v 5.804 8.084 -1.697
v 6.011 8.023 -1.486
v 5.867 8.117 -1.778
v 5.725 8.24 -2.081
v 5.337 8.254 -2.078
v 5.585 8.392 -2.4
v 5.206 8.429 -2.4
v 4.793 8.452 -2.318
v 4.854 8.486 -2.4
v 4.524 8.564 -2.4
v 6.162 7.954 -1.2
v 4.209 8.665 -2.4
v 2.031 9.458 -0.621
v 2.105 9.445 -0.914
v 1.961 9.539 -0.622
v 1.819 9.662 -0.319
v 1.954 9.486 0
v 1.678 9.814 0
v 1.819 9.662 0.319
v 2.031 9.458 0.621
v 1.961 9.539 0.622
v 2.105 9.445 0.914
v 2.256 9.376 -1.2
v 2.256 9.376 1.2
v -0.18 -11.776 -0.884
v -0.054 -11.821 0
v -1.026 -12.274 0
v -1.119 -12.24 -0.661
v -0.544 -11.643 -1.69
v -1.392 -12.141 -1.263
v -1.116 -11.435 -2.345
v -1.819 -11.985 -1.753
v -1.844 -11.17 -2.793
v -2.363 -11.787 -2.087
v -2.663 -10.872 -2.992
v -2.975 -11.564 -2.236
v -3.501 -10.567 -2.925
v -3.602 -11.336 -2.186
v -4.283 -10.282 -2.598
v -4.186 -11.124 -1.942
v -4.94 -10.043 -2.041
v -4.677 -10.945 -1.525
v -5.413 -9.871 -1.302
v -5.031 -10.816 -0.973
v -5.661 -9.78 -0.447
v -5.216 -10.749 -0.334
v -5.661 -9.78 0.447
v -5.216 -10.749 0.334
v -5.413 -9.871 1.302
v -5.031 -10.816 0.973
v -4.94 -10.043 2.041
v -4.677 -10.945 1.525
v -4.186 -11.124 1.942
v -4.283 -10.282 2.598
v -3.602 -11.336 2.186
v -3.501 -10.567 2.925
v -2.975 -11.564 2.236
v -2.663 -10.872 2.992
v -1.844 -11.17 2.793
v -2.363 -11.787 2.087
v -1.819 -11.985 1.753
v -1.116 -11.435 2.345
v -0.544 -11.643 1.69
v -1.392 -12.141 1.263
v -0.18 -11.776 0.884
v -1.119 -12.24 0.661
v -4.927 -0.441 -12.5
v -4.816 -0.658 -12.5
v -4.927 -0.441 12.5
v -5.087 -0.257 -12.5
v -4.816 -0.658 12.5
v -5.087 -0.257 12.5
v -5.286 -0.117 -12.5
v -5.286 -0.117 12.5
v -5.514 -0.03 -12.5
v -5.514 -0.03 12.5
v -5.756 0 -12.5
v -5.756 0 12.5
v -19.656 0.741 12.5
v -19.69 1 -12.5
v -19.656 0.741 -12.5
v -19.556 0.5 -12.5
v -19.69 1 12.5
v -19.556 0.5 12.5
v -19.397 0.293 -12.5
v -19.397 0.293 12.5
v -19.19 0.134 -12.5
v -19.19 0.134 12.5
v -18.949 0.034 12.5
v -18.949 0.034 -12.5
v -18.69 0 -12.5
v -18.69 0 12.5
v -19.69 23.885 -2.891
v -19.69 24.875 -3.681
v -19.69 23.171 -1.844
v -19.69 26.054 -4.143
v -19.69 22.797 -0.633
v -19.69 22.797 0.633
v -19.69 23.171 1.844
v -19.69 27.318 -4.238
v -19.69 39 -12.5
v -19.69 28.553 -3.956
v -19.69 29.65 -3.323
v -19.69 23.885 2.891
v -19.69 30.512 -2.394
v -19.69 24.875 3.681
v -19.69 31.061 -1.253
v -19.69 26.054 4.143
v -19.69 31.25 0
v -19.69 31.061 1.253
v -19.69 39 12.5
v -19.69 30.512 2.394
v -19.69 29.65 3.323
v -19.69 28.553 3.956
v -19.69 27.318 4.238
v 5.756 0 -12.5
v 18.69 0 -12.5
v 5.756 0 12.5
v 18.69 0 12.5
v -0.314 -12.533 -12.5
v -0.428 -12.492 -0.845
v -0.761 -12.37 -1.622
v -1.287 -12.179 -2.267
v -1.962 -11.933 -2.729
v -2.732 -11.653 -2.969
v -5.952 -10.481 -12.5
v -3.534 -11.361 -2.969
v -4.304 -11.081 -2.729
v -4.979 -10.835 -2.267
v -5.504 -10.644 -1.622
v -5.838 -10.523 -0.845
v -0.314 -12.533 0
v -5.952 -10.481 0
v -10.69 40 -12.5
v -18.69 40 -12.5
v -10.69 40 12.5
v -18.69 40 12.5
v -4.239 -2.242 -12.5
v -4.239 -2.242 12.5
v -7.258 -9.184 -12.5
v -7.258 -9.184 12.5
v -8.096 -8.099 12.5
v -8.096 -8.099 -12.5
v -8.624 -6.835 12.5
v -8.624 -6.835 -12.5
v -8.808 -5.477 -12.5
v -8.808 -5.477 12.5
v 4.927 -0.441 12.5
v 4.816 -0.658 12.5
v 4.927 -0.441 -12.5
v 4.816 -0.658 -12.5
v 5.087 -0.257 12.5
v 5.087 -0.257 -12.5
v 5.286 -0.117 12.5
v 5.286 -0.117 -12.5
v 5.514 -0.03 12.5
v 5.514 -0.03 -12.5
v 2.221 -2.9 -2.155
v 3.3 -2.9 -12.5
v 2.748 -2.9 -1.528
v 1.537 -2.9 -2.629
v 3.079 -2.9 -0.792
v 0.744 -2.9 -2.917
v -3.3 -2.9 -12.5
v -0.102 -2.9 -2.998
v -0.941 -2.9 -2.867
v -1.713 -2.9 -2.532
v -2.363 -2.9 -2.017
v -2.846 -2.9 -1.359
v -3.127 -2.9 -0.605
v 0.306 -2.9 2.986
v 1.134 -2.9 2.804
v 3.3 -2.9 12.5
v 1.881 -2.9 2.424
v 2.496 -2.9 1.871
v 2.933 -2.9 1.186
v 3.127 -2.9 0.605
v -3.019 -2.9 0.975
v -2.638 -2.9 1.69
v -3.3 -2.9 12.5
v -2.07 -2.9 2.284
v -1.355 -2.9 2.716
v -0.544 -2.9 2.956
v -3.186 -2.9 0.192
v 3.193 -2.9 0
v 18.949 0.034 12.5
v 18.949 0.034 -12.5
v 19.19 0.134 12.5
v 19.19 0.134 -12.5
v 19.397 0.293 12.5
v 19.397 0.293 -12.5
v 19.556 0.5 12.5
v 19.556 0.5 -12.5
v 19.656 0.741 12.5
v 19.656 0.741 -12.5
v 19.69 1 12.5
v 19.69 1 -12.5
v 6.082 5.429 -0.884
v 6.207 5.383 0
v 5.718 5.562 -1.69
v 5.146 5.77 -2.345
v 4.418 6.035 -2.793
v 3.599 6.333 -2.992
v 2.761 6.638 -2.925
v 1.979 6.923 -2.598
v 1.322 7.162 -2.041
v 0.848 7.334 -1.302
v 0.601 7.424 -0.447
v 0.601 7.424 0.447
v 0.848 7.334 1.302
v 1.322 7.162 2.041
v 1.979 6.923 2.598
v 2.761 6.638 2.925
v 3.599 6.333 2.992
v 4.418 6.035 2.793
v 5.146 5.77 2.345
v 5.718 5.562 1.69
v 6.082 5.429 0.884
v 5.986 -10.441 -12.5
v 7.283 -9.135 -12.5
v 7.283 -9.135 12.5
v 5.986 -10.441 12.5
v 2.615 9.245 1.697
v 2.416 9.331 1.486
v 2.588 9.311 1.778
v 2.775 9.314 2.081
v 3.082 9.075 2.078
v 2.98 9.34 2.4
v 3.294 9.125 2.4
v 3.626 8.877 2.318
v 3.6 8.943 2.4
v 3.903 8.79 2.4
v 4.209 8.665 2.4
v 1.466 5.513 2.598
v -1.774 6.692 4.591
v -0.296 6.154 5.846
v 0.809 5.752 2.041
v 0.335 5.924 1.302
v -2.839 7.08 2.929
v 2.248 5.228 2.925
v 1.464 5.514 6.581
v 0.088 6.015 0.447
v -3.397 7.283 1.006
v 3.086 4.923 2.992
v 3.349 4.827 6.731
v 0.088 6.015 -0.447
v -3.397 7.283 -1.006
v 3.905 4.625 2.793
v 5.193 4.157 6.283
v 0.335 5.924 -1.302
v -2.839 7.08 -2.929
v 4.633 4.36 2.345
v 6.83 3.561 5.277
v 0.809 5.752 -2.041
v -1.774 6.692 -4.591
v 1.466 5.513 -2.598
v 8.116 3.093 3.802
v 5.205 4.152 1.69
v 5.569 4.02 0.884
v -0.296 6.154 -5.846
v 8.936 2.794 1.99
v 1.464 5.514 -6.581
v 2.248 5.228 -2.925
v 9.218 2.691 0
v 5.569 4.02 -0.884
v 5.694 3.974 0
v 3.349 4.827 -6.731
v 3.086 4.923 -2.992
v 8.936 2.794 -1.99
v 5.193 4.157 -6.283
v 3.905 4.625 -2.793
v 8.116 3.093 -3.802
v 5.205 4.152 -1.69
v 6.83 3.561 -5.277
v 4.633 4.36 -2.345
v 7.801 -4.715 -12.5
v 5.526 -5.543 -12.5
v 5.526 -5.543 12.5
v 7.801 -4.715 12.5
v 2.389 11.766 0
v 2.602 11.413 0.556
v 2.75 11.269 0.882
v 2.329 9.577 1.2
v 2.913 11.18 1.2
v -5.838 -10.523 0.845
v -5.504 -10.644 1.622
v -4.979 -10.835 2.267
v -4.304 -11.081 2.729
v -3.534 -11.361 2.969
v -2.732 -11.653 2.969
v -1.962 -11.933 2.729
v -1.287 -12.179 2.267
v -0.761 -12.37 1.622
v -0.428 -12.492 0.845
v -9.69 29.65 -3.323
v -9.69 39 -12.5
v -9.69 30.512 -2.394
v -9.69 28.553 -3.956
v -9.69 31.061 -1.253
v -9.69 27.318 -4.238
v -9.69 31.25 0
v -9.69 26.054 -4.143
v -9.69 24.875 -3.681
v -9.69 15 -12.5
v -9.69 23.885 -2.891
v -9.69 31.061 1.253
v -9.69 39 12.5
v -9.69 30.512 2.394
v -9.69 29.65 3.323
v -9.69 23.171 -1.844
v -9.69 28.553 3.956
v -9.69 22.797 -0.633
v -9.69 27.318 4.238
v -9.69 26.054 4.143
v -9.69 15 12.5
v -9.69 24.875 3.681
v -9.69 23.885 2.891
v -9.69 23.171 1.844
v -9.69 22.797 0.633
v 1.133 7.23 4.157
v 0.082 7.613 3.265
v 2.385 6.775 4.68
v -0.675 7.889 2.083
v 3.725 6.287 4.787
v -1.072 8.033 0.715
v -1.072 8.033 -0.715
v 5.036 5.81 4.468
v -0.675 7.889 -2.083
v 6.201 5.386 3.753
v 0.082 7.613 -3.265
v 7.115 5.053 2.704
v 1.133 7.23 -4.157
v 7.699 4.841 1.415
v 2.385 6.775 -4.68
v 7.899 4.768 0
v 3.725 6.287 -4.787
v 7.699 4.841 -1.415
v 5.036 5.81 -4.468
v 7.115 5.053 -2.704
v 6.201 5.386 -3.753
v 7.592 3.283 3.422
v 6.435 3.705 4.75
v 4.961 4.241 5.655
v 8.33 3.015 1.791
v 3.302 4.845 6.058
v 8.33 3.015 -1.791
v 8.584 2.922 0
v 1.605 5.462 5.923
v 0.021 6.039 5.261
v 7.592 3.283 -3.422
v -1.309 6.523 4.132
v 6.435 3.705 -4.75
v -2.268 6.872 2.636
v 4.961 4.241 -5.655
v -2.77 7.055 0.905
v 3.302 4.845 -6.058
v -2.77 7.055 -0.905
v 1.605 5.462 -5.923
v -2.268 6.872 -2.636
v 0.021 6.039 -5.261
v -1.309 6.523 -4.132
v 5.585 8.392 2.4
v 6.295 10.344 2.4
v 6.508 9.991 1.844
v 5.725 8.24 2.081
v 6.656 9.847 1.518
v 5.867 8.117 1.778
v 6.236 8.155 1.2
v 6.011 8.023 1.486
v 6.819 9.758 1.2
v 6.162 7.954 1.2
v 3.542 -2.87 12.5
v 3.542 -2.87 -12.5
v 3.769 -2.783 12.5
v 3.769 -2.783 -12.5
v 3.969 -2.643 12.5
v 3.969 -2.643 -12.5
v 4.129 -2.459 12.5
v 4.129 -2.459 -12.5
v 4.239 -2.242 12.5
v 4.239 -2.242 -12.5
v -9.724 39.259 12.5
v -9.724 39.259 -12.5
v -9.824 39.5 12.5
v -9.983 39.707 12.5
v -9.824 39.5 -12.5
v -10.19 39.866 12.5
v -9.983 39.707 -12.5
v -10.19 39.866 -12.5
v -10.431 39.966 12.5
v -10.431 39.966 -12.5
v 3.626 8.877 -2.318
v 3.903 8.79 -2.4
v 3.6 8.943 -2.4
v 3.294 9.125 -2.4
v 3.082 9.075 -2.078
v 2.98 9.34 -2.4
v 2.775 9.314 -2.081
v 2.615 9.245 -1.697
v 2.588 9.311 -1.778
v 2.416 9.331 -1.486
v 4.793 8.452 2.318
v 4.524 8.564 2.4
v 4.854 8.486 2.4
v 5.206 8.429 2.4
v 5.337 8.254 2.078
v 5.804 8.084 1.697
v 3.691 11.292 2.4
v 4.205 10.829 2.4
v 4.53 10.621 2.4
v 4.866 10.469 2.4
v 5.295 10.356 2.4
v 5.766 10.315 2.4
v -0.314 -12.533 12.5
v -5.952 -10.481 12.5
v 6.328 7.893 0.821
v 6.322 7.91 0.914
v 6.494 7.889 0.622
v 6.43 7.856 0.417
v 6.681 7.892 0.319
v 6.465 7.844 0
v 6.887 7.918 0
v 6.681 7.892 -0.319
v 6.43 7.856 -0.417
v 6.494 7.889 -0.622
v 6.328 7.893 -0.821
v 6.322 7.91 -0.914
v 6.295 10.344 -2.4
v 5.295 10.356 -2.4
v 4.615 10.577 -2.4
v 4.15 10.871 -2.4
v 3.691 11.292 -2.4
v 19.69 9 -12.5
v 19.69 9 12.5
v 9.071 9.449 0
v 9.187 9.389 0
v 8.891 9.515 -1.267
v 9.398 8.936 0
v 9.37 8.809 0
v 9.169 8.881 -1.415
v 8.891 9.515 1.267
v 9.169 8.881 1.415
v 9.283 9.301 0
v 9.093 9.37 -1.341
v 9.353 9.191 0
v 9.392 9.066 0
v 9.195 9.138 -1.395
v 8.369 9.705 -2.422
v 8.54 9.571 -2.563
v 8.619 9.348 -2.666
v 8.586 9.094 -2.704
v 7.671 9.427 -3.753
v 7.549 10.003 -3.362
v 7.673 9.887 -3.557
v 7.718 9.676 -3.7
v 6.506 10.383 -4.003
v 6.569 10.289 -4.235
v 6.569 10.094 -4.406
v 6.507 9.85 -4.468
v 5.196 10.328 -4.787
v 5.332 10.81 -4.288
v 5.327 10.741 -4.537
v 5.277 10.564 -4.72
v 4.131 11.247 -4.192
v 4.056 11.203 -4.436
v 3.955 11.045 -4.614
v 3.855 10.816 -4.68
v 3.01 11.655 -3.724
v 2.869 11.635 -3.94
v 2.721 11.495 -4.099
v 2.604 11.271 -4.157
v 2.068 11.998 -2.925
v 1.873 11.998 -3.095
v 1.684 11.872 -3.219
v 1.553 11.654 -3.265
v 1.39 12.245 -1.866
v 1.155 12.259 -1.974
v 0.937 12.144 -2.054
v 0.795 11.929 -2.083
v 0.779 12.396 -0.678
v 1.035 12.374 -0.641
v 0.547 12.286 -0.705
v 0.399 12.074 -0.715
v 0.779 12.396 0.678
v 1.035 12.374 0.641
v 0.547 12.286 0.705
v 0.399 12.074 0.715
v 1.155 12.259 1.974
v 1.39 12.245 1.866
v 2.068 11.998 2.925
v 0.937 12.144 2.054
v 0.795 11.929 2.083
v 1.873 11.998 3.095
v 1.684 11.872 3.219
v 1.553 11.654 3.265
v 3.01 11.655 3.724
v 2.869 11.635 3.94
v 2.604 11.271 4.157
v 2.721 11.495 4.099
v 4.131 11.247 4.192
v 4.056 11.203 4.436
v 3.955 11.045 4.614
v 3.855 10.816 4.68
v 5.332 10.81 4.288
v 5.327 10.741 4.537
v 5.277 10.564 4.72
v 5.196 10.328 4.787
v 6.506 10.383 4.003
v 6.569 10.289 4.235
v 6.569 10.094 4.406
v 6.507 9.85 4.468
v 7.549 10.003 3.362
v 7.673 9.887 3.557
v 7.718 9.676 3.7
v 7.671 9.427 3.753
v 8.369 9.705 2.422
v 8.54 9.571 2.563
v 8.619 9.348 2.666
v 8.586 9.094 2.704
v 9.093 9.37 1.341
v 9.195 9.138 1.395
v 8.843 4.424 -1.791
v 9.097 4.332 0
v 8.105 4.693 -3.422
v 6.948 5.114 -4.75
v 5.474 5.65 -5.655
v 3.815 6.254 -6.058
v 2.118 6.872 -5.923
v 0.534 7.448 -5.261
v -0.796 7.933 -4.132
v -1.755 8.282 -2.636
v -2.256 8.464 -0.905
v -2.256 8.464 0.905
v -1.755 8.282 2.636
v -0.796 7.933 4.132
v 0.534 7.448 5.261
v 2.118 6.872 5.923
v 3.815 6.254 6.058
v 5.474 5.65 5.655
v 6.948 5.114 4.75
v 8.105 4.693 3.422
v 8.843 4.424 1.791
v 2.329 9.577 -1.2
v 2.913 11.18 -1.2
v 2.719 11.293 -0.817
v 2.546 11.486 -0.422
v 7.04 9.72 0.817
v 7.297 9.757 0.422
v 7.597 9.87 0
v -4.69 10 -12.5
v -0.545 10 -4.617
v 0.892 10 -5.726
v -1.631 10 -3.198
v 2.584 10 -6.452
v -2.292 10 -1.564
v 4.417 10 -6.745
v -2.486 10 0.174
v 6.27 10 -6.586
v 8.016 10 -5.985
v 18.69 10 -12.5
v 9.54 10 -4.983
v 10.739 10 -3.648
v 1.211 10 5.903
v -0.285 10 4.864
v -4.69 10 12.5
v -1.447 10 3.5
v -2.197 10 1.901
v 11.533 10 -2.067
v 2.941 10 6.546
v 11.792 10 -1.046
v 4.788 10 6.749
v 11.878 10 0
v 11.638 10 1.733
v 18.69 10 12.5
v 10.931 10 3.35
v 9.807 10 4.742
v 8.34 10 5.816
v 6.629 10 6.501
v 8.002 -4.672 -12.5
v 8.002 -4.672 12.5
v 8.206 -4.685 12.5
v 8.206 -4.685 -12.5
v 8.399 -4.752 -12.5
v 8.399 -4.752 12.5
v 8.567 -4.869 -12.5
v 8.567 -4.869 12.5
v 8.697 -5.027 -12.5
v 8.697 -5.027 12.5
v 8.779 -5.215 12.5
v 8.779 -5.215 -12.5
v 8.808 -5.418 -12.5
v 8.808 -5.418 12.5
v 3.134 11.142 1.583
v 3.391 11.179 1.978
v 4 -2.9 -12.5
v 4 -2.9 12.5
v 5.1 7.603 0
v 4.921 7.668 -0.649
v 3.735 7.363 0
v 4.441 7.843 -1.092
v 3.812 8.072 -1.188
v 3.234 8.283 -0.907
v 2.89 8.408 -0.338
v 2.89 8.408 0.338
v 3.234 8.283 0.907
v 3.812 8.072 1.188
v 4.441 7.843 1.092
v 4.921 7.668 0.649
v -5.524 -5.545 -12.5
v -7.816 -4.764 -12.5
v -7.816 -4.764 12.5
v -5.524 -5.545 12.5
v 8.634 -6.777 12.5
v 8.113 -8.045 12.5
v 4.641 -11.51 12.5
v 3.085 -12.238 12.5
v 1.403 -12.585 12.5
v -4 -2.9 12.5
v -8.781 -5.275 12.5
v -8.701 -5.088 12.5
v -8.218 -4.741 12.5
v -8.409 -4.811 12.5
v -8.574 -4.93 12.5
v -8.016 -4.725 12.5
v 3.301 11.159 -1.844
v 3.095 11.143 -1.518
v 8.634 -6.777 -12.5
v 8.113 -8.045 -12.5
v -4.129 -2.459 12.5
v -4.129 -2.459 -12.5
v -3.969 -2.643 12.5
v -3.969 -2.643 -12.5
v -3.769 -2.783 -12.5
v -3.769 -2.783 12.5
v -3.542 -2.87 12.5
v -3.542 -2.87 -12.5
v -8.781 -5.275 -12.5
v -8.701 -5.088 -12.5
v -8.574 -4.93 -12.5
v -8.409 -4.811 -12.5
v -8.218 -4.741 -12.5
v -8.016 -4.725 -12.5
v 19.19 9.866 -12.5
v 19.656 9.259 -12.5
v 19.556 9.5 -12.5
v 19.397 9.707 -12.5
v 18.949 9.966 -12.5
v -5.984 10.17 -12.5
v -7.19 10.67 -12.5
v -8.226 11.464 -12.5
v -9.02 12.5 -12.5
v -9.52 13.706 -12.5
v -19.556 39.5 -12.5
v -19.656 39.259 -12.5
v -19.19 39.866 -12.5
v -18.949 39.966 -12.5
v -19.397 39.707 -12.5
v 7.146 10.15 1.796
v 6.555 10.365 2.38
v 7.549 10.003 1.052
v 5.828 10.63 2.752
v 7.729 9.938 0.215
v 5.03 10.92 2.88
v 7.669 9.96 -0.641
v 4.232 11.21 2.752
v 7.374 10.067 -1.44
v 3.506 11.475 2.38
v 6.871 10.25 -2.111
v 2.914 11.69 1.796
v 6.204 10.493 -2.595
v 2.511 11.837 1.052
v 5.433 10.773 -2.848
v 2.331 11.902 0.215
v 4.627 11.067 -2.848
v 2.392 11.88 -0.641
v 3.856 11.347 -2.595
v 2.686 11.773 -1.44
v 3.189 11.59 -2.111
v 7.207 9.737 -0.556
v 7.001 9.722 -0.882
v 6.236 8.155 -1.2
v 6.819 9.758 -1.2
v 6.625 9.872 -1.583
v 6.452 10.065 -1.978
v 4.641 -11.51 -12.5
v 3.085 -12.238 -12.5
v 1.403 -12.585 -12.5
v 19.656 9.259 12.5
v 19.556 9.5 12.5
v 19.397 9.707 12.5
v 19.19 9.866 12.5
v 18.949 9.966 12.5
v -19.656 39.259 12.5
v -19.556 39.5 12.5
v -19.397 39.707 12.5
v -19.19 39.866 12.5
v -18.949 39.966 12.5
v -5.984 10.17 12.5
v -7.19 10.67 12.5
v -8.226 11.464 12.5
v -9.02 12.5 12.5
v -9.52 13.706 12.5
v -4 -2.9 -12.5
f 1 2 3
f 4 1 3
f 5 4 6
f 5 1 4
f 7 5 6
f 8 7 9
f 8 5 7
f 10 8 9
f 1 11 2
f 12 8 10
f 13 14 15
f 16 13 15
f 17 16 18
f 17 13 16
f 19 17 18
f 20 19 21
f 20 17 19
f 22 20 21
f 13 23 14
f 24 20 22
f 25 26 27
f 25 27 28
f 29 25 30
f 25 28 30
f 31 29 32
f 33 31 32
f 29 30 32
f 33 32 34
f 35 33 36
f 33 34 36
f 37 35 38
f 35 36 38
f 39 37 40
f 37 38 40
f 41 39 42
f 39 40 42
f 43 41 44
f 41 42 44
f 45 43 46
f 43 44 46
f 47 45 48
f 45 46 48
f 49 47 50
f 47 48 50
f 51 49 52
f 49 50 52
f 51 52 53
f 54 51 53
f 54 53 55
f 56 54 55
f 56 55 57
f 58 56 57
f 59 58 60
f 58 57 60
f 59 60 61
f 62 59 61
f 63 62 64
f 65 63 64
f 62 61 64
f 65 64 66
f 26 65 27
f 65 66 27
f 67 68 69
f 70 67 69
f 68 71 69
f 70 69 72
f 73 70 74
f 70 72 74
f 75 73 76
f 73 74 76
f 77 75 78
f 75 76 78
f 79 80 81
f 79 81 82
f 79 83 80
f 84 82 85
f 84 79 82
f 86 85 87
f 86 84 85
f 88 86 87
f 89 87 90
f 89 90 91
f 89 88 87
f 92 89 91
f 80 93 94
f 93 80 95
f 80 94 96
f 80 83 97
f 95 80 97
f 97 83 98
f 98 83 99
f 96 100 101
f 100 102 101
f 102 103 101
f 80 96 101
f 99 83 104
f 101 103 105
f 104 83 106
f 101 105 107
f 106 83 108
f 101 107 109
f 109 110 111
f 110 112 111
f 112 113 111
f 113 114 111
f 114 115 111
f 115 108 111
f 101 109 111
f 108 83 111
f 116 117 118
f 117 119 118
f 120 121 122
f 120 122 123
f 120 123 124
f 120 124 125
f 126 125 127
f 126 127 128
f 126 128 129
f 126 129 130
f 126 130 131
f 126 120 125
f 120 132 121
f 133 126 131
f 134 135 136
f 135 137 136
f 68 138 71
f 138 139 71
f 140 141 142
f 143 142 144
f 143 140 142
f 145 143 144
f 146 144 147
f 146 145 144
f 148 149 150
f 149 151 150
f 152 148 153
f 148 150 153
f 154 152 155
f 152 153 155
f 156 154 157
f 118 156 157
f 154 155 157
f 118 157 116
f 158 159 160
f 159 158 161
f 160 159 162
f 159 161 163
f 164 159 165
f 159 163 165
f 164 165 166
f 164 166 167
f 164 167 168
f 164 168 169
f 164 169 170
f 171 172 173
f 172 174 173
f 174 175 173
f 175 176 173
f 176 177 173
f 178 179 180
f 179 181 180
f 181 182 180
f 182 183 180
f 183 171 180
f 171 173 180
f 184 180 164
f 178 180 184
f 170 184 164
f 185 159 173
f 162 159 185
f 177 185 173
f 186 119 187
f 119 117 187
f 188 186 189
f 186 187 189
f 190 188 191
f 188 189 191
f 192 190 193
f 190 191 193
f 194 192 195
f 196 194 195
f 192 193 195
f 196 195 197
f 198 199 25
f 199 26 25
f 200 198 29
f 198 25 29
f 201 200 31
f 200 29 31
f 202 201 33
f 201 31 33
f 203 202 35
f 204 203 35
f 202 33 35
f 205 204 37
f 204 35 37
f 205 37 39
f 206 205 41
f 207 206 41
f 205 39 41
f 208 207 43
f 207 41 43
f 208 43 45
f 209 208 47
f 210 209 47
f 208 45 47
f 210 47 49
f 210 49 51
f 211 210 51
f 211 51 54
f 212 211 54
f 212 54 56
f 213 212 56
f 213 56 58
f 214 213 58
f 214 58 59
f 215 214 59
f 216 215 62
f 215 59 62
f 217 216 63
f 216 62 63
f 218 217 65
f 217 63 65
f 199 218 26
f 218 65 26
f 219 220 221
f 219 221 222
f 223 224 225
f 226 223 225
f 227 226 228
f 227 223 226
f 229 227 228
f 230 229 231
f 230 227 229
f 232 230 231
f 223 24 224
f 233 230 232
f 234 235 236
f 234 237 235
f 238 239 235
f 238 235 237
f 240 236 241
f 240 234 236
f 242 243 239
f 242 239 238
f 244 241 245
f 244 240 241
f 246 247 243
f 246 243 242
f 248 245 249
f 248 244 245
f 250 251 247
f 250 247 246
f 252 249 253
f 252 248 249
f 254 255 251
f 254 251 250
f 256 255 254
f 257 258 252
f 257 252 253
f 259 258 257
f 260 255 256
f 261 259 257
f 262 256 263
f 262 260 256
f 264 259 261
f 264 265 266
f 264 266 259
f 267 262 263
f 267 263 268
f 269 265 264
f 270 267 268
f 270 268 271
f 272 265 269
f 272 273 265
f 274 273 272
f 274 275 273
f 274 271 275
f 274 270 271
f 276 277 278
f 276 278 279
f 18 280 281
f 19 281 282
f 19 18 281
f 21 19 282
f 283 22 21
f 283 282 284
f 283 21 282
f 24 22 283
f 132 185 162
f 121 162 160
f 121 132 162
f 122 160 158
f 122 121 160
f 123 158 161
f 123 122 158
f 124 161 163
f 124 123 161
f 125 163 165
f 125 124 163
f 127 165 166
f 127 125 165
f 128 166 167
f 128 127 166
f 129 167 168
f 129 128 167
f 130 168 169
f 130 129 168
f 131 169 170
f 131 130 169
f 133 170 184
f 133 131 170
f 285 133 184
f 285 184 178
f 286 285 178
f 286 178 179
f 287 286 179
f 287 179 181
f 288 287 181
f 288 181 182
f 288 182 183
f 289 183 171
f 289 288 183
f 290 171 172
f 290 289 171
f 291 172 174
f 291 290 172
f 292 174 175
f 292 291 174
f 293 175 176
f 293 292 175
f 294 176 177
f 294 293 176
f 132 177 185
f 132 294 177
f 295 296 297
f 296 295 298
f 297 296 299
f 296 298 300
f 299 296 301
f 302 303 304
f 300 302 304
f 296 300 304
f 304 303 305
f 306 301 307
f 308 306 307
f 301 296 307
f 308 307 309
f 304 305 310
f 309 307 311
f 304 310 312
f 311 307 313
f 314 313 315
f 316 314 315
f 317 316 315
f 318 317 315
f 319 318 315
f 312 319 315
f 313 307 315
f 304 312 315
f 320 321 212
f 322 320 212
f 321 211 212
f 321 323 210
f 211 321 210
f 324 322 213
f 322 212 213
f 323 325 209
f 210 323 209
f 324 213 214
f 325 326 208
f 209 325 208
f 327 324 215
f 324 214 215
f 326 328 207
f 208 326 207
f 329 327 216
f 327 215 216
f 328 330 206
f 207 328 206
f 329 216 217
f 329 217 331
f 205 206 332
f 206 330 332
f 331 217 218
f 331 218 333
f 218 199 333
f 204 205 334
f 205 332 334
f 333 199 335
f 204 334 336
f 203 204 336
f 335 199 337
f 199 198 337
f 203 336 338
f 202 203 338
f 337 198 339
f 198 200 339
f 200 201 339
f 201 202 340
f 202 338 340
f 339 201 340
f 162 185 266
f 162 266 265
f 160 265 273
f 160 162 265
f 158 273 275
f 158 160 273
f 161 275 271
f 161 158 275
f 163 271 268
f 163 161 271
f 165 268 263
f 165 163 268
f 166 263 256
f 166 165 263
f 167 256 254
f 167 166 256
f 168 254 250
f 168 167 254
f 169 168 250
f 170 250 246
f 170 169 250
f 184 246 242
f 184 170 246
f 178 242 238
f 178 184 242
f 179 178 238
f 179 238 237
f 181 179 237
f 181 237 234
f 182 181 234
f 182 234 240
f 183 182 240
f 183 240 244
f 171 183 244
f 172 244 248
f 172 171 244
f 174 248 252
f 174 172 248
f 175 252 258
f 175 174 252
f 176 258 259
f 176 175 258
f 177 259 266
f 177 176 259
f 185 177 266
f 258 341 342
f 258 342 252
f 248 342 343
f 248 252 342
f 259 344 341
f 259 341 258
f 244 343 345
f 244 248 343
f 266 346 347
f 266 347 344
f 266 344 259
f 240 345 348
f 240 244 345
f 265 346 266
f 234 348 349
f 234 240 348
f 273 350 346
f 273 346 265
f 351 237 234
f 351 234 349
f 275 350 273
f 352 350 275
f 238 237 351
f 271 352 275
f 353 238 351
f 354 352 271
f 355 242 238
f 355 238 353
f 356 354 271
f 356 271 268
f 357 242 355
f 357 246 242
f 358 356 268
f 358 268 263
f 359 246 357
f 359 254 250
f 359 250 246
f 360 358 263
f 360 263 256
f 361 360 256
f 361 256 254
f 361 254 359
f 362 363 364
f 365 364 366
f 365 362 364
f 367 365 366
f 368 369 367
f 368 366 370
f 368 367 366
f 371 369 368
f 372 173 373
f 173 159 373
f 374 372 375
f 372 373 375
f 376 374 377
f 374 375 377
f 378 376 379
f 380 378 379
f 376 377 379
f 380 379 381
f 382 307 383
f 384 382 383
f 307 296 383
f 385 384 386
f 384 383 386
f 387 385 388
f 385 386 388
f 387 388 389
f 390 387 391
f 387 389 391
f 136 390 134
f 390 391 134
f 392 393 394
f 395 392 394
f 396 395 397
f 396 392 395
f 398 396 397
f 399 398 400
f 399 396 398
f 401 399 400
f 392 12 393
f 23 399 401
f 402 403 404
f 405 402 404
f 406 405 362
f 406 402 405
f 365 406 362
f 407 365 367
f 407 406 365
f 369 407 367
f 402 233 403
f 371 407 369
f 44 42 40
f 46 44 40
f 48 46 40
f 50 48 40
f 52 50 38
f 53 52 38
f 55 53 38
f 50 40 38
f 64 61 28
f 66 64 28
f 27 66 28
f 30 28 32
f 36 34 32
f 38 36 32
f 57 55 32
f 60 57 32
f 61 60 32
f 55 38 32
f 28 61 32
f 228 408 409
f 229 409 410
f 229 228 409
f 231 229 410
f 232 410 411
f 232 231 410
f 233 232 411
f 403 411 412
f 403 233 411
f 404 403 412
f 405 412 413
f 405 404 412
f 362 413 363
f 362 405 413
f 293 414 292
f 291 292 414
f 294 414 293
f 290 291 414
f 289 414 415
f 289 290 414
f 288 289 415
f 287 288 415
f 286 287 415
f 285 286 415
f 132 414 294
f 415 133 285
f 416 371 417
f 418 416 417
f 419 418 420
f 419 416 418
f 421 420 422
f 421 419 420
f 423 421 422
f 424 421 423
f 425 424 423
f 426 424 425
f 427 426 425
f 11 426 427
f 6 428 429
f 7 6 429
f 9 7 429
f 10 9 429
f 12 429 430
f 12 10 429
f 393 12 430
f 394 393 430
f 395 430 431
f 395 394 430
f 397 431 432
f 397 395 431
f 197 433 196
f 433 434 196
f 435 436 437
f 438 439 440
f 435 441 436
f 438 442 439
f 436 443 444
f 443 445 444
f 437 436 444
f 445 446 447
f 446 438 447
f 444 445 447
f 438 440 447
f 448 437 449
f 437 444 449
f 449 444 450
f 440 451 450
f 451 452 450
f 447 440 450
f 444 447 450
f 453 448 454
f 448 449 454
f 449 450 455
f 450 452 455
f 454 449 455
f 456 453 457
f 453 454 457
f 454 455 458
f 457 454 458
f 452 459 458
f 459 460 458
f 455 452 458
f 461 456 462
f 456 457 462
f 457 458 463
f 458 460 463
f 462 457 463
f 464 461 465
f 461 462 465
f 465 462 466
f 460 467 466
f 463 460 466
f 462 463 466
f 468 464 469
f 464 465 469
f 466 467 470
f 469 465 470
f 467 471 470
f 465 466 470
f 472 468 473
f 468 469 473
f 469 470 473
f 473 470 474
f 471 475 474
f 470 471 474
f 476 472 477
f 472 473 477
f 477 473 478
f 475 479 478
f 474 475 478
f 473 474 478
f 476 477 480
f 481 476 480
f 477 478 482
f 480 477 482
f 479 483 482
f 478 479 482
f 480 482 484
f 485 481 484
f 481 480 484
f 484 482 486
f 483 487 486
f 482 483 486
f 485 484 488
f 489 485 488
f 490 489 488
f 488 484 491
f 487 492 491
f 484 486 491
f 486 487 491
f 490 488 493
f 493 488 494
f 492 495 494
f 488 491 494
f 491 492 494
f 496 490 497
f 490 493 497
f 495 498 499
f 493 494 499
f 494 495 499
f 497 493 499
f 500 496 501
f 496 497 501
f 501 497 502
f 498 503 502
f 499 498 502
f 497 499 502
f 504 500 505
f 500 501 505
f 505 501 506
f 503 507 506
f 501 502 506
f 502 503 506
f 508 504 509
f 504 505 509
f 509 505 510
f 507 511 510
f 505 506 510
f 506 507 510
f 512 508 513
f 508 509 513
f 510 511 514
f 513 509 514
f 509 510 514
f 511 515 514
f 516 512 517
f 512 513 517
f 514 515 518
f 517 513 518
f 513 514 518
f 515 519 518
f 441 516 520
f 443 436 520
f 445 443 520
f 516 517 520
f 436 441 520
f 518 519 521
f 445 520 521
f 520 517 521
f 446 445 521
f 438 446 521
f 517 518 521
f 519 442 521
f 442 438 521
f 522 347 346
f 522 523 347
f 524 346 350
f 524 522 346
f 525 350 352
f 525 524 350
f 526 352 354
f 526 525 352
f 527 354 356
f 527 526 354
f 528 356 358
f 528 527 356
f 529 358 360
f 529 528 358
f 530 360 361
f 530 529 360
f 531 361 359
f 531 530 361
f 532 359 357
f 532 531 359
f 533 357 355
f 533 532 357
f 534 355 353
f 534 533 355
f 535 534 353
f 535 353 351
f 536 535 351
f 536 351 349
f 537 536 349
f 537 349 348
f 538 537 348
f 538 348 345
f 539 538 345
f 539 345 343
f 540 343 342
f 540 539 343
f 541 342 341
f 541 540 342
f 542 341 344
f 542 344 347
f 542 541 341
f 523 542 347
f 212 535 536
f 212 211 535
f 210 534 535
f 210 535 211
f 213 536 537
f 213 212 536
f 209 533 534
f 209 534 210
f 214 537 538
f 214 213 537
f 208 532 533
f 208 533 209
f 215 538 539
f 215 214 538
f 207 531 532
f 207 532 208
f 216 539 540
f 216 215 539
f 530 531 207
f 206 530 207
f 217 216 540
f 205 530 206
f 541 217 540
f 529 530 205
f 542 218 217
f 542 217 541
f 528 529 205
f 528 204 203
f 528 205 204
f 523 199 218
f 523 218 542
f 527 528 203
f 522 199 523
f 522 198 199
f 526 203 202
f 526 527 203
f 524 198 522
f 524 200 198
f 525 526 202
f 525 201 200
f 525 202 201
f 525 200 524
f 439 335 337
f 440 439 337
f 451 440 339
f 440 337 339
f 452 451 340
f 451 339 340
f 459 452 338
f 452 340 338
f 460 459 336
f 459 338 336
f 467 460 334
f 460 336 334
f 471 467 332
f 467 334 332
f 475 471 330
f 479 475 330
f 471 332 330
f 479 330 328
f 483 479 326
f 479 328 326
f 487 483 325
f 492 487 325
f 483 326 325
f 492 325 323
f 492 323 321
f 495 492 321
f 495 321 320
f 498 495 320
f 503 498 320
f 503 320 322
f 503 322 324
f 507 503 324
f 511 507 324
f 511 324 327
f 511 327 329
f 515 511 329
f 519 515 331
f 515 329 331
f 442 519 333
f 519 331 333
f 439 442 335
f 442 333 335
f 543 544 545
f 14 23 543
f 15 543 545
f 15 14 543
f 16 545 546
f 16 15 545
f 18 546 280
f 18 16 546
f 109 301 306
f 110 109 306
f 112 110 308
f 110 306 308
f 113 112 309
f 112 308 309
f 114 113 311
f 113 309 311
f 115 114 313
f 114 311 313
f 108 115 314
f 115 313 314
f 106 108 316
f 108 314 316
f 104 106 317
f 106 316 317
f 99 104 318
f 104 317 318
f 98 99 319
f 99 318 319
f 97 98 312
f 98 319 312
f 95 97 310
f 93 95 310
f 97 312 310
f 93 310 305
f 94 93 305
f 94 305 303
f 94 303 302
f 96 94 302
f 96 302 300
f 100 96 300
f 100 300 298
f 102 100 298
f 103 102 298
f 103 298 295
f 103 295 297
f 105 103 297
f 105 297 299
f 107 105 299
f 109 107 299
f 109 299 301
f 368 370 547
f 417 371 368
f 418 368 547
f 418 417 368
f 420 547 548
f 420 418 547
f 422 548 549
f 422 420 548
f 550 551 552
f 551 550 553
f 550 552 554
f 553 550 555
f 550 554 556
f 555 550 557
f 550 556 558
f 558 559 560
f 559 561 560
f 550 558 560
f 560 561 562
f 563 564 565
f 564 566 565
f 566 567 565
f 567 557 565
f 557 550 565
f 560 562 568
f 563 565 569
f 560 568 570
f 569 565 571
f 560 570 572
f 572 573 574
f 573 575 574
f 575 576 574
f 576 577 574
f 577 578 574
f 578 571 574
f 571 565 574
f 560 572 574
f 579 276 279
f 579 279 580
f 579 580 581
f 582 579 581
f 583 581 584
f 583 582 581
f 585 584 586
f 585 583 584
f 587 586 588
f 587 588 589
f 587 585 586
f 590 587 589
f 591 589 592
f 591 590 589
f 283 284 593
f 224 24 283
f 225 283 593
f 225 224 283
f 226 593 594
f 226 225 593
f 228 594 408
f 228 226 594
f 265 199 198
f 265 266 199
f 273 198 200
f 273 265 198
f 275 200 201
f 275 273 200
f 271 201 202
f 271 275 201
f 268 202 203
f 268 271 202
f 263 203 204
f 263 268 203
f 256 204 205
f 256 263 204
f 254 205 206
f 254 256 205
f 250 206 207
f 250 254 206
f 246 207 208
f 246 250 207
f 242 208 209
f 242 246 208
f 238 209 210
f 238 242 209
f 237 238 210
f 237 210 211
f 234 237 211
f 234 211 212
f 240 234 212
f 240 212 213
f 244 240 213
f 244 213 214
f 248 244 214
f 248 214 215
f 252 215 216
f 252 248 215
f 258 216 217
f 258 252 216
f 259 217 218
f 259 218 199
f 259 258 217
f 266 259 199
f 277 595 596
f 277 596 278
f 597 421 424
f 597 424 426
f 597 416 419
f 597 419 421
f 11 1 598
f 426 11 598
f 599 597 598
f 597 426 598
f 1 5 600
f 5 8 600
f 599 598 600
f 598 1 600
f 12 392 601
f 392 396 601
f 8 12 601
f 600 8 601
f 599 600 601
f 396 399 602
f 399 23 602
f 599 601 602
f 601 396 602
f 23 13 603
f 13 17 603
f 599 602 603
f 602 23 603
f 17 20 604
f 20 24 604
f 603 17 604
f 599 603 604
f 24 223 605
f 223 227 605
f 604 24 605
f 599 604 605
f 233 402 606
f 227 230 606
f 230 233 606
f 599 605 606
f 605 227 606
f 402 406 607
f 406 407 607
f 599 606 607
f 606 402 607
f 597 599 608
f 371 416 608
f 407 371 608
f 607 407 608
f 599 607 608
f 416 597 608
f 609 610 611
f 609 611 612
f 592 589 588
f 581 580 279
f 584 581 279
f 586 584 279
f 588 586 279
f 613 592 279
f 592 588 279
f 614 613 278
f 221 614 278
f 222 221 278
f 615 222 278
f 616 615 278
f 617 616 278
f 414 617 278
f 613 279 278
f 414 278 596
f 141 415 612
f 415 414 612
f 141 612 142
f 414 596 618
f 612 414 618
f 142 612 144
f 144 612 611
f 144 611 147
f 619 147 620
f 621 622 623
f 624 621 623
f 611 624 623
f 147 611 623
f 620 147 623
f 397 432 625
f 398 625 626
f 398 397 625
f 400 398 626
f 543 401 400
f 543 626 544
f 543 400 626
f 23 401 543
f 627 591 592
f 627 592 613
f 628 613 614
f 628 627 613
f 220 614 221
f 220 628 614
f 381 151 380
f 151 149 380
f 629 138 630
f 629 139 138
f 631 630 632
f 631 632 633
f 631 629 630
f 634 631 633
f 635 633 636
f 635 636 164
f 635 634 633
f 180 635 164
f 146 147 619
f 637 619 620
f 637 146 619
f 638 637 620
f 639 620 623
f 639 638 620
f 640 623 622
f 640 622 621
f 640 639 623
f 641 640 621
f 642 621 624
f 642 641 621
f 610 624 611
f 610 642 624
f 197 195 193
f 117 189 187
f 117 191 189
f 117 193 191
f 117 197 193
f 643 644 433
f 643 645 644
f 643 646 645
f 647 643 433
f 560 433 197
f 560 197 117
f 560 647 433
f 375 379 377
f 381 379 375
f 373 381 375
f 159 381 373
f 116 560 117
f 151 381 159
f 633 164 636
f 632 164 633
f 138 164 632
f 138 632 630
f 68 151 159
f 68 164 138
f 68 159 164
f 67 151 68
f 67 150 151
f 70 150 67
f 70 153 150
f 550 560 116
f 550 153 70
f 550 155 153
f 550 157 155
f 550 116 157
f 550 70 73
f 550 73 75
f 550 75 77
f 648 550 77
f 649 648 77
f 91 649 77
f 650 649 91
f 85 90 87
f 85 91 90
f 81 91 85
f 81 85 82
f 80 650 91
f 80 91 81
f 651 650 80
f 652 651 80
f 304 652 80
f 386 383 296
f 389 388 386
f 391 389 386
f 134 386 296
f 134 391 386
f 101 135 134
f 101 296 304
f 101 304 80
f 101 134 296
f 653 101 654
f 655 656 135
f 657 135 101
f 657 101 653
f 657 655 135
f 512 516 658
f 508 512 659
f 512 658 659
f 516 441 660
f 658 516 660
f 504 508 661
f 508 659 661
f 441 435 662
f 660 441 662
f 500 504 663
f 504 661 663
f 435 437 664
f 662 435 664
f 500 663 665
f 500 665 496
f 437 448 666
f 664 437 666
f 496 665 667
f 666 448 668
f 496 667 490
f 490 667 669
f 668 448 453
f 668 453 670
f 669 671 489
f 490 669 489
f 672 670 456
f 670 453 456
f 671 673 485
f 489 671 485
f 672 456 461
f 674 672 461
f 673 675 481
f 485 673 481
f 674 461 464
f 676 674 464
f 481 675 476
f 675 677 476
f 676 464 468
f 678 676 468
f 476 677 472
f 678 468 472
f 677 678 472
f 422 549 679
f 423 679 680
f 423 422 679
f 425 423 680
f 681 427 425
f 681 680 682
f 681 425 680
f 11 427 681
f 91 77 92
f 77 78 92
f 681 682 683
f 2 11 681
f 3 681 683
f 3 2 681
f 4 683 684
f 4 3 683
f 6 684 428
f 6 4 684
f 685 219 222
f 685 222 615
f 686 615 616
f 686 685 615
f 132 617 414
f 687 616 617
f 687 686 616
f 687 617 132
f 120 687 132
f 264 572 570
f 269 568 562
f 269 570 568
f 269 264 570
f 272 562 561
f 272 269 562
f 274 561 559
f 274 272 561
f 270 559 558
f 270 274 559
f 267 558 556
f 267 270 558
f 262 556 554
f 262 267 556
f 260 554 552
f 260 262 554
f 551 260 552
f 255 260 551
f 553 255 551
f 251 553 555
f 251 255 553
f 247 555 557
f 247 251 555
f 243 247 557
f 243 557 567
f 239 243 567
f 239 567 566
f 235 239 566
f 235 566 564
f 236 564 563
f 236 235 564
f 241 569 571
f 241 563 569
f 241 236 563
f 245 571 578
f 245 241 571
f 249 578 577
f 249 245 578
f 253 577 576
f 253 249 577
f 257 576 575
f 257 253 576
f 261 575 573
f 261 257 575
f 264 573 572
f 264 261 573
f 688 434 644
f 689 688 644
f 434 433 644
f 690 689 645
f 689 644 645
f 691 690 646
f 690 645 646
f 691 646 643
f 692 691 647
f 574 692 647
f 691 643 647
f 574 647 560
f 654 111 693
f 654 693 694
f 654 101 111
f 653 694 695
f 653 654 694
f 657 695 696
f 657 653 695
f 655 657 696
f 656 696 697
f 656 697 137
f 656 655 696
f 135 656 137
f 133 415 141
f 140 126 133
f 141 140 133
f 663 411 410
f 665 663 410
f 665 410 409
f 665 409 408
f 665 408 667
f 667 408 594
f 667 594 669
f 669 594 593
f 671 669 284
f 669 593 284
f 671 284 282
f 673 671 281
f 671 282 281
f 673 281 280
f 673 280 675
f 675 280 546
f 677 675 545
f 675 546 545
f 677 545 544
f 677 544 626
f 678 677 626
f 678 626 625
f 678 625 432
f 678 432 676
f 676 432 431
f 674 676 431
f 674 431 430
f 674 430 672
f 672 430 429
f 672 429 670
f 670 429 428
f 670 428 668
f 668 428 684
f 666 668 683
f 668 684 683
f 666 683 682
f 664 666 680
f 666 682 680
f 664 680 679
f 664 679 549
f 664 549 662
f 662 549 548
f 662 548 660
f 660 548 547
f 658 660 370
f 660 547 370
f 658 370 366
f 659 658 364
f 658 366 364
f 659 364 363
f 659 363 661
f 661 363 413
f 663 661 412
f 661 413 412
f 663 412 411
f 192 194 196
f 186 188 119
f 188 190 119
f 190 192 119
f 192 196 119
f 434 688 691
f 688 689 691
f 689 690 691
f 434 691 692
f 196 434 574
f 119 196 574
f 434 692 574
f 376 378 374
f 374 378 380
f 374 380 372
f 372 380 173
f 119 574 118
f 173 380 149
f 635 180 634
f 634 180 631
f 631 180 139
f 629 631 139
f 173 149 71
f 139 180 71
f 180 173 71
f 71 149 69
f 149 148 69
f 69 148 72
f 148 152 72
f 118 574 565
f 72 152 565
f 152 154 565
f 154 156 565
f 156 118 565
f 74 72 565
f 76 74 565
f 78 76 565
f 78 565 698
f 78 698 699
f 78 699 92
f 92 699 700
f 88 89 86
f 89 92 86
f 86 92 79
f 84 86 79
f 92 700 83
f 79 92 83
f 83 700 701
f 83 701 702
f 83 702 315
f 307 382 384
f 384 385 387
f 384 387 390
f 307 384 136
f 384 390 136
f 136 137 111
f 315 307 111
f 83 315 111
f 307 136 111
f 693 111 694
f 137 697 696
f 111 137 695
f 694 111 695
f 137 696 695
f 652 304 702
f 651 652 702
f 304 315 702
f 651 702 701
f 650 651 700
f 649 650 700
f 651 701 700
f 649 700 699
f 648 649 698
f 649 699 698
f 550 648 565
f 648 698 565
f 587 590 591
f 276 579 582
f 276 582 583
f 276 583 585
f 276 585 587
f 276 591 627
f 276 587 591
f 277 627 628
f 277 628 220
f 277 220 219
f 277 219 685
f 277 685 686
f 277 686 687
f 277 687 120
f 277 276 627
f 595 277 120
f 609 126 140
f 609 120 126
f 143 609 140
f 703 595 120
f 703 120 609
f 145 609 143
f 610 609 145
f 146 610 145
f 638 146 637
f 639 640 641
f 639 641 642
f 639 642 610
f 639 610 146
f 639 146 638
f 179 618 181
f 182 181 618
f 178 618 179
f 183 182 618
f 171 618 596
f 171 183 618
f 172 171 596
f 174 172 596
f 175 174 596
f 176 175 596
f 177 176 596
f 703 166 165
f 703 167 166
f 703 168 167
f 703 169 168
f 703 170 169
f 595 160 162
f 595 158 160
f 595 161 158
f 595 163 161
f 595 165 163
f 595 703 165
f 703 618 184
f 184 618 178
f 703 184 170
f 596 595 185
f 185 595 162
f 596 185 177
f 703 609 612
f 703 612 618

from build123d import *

# Parameters (mm, degrees)
BOSS_EXTRUDE1_DEPTH  = 12.5
BOSS_EXTRUDE2_DEPTH  = 25
FILLET1_R            = 1
SKETCH5_R            = 4.25
CUT_EXTRUDE1_DEPTH   = 52.180410315
CUT_EXTRUDE2_START   = -2.185640545
CUT_EXTRUDE2_DEPTH   = 3.185640545
CUT_EXTRUDE2_START_2 = 9.581895702
CUT_EXTRUDE2_2_DEPTH = 0.214359555
FILLET2_R            = 0.5


with BuildPart() as part:
    # Sketch3 → Boss-Extrude1 (new, symmetric)
    with BuildSketch(Plane.XY):
        with BuildLine():
            Line((-19.69, 0), (-19.69, 40))
            Line((-19.69, 40), (-9.69, 40))
            Line((-9.69, 40), (-9.69, 15))
            ThreePointArc((-9.69, 15), (-8.225533906, 11.464466094), (-4.69, 10))
            Line((-4.69, 10), (19.69, 10))
            Line((19.69, 10), (19.69, 0))
            Line((19.69, 0), (5.055513679, 0))
            Line((5.055513679, 0), (4, -2.9))
            Line((4, -2.9), (-4, -2.9))
            Line((-4, -2.9), (-5.055513679, 0))
            Line((-5.055513679, 0), (-19.69, 0))
        make_face()
    extrude(amount=BOSS_EXTRUDE1_DEPTH, both=True)

    # Fillet1
    fillet1_edges = [part.edges().sort_by_distance(p)[0] for p in [
        (-19.69, 0, 0),
        (-19.69, 40, 0),
        (-9.69, 40, 0),
        (19.69, 10, 0),
        (19.69, 0, 0),
        (5.055513679, 0, 0),
        (4, -2.9, 0),
        (-4, -2.9, 0),
        (-5.055513679, 0, 0),
    ]]
    fillet(fillet1_edges, radius=FILLET1_R)

    # Sketch5 → Cut-Extrude1 (cut, through all)
    with BuildSketch(Plane(origin=(-9.69, 0, 0), x_dir=(0, 0, -1), z_dir=(1, 0, 0))):
        with Locations(Location((0, 27, 0), (0, 0, 90))):
            Circle(SKETCH5_R)
    extrude(amount=-CUT_EXTRUDE1_DEPTH, mode=Mode.SUBTRACT)


with BuildPart() as body_2:
    # Sketch4 → Boss-Extrude2 (new body)
    with BuildSketch(Plane(origin=(0, 0, -12.5), x_dir=(-1, 0, 0), z_dir=(0, 0, -1))):
        with BuildLine():
            Line((5.951811032, -10.481053216), (7.257797729, -9.183813367))
            ThreePointArc((7.257797729, -9.183813367), (8.40157105, -7.484424253), (8.807951751, -5.476690332))
            ThreePointArc((8.807951751, -5.476690332), (8.495563879, -4.8650732), (7.816237548, -4.764189924))
            Line((7.816237548, -4.764189924), (5.524133229, -5.544554929))
            Line((5.524133229, -5.544554929), (4, -2.9))
            Line((4, -2.9), (-4, -2.9))
            Line((-4, -2.9), (-5.52615963, -5.54338602))
            Line((-5.52615963, -5.54338602), (-7.801440877, -4.715251372))
            ThreePointArc((-7.801440877, -4.715251372), (-8.487105577, -4.804934967), (-8.807951751, -5.41750085))
            ThreePointArc((-8.807951751, -5.41750085), (-8.415072056, -7.427920287), (-7.282744336, -9.134957107))
            Line((-7.282744336, -9.134957107), (-5.985504487, -10.440943804))
            ThreePointArc((-5.985504487, -10.440943804), (-3.08532669, -12.237943633), (0.313655308, -12.533174076))
            Line((0.313655308, -12.533174076), (5.951811032, -10.481053216))
        make_face()
    extrude(amount=-BOSS_EXTRUDE2_DEPTH)


with BuildPart() as cut_revolve1_tool:
    # Sketch7 → Cut-Revolve1 (revolve)
    with BuildSketch(Plane.XY):
        Polygon((-3.13273317, -11.507113646), (5.535490796, 12.308635967), (11.878415986, 10), (9.218290041, 2.691364033), (5.694442713, 3.97393957), (-0.313655308, -12.533174076), align=None)
    revolve(axis=Axis((-3.13273317, -11.507113646, 0), (0.3420201433256561, 0.939692620785913, 0)))


with BuildPart() as part_1:
    add(part.part)

    # Cut-Revolve1: cut by cut_revolve1_tool
    add(cut_revolve1_tool.part, mode=Mode.SUBTRACT)


with BuildPart() as body_2_1:
    add(body_2.part)

    # Cut-Revolve1: cut by cut_revolve1_tool
    add(cut_revolve1_tool.part, mode=Mode.SUBTRACT)


with BuildPart() as body_3:
    # Sketch8 → Revolve1 (revolve)
    with BuildSketch(Plane.XY):
        Polygon((-1.025728279, -12.27400071), (-3.13273317, -11.507113646), (3.735326397, 7.362724931), (6.4645057, 7.843952877), (7.285354044, 10.099215167), (9.540616333, 9.278366823), (7.898919645, 4.767842243), (6.207472928, 5.383478501), (-0.054481942, -11.821101105), align=None)
    revolve(axis=Axis((-3.13273317, -11.507113646, 0), (0.34202014332565683, 0.9396926207859128, 0)))

    # Cut-Extrude2: read off the stored shape, not the designer's step
    # Cut-Extrude2 outline → Cut-Extrude2 (cut)
    with BuildSketch(Plane(origin=(4.09804972, 11.259299068, 0), x_dir=(0.9396926207859128, -0.34202014332565694, 0), z_dir=(0.3420201433256569, 0.9396926207859126, 0)).offset(CUT_EXTRUDE2_START)):
        with BuildLine():
            Line((-1.086593285, 1.200016053), (-1.779422876, 0))
            Line((-1.779422876, 0), (-1.086593285, -1.200016053))
            ThreePointArc((-1.086593285, -1.200016053), (-1.408141584, 0), (-1.086593285, 1.200016053))
        make_face()
        with BuildLine():
            ThreePointArc((0.991858416, -2.4), (-0.208133558, -2.078465603), (-1.086593285, -1.200016053))
            Line((-1.086593285, -1.200016053), (-0.39378223, -2.4))
            Line((-0.39378223, -2.4), (0.991858416, -2.4))
        make_face()
        with BuildLine():
            Line((-0.39378223, 2.4), (-1.086593285, 1.200016053))
            ThreePointArc((-1.086593285, 1.200016053), (-0.208133558, 2.078465603), (0.991858416, 2.4))
            Line((0.991858416, 2.4), (-0.39378223, 2.4))
        make_face()
        with BuildLine():
            ThreePointArc((3.070310117, -1.200016053), (2.19185039, -2.078465603), (0.991858416, -2.4))
            Line((0.991858416, -2.4), (2.377499062, -2.4))
            Line((2.377499062, -2.4), (3.070310117, -1.200016053))
        make_face()
        with BuildLine():
            Line((2.377499062, 2.4), (0.991858416, 2.4))
            ThreePointArc((0.991858416, 2.4), (2.19185039, 2.078465603), (3.070310117, 1.200016053))
            Line((3.070310117, 1.200016053), (2.377499062, 2.4))
        make_face()
        with BuildLine():
            ThreePointArc((3.070310117, 1.200016053), (3.391858416, 0), (3.070310117, -1.200016053))
            Line((3.070310117, -1.200016053), (3.763139708, 0))
            Line((3.763139708, 0), (3.070310117, 1.200016053))
        make_face()
    extrude(amount=CUT_EXTRUDE2_DEPTH, mode=Mode.SUBTRACT)

    # Cut-Extrude2 2 outline → Cut-Extrude2 2 (cut)
    with BuildSketch(Plane(origin=(0, 0, 0), x_dir=(0.9396926207859128, -0.34202014332565644, 0), z_dir=(0.34202014332565644, 0.9396926207859129, 0)).offset(CUT_EXTRUDE2_START_2)):
        with BuildLine():
            Line((-1.086593285, 1.200016053), (-1.779422876, 0))
            Line((-1.779422876, 0), (-1.086593285, -1.200016053))
            ThreePointArc((-1.086593285, -1.200016053), (-1.408141584, 0), (-1.086593285, 1.200016053))
        make_face()
        with BuildLine():
            ThreePointArc((0.991858416, -2.4), (-0.208133558, -2.078465603), (-1.086593285, -1.200016053))
            Line((-1.086593285, -1.200016053), (-0.39378223, -2.4))
            Line((-0.39378223, -2.4), (0.991858416, -2.4))
        make_face()
        with BuildLine():
            Line((-0.39378223, 2.4), (-1.086593285, 1.200016053))
            ThreePointArc((-1.086593285, 1.200016053), (-0.208133558, 2.078465603), (0.991858416, 2.4))
            Line((0.991858416, 2.4), (-0.39378223, 2.4))
        make_face()
        with BuildLine():
            ThreePointArc((3.070310117, -1.200016053), (2.19185039, -2.078465603), (0.991858416, -2.4))
            Line((0.991858416, -2.4), (2.377499062, -2.4))
            Line((2.377499062, -2.4), (3.070310117, -1.200016053))
        make_face()
        with BuildLine():
            Line((2.377499062, 2.4), (0.991858416, 2.4))
            ThreePointArc((0.991858416, 2.4), (2.19185039, 2.078465603), (3.070310117, 1.200016053))
            Line((3.070310117, 1.200016053), (2.377499062, 2.4))
        make_face()
        with BuildLine():
            ThreePointArc((3.070310117, 1.200016053), (3.391858416, 0), (3.070310117, -1.200016053))
            Line((3.070310117, -1.200016053), (3.763139708, 0))
            Line((3.763139708, 0), (3.070310117, 1.200016053))
        make_face()
    extrude(amount=CUT_EXTRUDE2_2_DEPTH, mode=Mode.SUBTRACT)

    # Cut-Extrude2 3 outline → Cut-Extrude2 3 (revolve)
    with BuildSketch(Plane(origin=(0.932042034, -0.339235557, 0), x_dir=(0.9396926207859126, -0.342020143325657, 0), z_dir=(0, 0, 1))):
        Polygon((2.771281293, 9.796255156), (2.399999957, 9.581895777), (2.771281292, 9.581895702), align=None)
    revolve(axis=Axis((0.932042034, -0.339235557, 0), (0.342020143325657, 0.9396926207859126, 0)))

    # Cut-Extrude3 cone 1 section (through the dimple's axis) → Cut-Extrude3 (revolve, cut)
    with BuildSketch(Plane(origin=(5.030091754, 10.920063511, 0), x_dir=(0, 0, 1), z_dir=(0.939692621, -0.342020143, 0))):
        Polygon((0, 0), (2.88, 0), (0, 2.88), align=None)
    revolve(axis=Axis((5.030091754, 10.920063511, 0), (-0.342020143, -0.939692621, 0)), mode=Mode.SUBTRACT)

    # Fillet2
    fillet2_edges = [body_3.edges().sort_by_distance(p)[0] for p in [
        (0.519567174, 12.561760199, 0),
    ]]
    fillet(fillet2_edges, radius=FILLET2_R)


with BuildPart() as body_4:
    # Sketch8<3> → Revolve2 (revolve)
    with BuildSketch(Plane.XY):
        Polygon((6.207472928, 5.383478501), (5.694442713, 3.97393957), (8.583997522, 2.922227629), (9.097027737, 4.33176656), (7.898919645, 4.767842243), align=None)
    revolve(axis=Axis((-3.13273317, -11.507113646, 0), (0.34202014332565683, 0.9396926207859128, 0)))


solid = Compound([part_1.part, body_2_1.part, body_3.part, body_4.part])
